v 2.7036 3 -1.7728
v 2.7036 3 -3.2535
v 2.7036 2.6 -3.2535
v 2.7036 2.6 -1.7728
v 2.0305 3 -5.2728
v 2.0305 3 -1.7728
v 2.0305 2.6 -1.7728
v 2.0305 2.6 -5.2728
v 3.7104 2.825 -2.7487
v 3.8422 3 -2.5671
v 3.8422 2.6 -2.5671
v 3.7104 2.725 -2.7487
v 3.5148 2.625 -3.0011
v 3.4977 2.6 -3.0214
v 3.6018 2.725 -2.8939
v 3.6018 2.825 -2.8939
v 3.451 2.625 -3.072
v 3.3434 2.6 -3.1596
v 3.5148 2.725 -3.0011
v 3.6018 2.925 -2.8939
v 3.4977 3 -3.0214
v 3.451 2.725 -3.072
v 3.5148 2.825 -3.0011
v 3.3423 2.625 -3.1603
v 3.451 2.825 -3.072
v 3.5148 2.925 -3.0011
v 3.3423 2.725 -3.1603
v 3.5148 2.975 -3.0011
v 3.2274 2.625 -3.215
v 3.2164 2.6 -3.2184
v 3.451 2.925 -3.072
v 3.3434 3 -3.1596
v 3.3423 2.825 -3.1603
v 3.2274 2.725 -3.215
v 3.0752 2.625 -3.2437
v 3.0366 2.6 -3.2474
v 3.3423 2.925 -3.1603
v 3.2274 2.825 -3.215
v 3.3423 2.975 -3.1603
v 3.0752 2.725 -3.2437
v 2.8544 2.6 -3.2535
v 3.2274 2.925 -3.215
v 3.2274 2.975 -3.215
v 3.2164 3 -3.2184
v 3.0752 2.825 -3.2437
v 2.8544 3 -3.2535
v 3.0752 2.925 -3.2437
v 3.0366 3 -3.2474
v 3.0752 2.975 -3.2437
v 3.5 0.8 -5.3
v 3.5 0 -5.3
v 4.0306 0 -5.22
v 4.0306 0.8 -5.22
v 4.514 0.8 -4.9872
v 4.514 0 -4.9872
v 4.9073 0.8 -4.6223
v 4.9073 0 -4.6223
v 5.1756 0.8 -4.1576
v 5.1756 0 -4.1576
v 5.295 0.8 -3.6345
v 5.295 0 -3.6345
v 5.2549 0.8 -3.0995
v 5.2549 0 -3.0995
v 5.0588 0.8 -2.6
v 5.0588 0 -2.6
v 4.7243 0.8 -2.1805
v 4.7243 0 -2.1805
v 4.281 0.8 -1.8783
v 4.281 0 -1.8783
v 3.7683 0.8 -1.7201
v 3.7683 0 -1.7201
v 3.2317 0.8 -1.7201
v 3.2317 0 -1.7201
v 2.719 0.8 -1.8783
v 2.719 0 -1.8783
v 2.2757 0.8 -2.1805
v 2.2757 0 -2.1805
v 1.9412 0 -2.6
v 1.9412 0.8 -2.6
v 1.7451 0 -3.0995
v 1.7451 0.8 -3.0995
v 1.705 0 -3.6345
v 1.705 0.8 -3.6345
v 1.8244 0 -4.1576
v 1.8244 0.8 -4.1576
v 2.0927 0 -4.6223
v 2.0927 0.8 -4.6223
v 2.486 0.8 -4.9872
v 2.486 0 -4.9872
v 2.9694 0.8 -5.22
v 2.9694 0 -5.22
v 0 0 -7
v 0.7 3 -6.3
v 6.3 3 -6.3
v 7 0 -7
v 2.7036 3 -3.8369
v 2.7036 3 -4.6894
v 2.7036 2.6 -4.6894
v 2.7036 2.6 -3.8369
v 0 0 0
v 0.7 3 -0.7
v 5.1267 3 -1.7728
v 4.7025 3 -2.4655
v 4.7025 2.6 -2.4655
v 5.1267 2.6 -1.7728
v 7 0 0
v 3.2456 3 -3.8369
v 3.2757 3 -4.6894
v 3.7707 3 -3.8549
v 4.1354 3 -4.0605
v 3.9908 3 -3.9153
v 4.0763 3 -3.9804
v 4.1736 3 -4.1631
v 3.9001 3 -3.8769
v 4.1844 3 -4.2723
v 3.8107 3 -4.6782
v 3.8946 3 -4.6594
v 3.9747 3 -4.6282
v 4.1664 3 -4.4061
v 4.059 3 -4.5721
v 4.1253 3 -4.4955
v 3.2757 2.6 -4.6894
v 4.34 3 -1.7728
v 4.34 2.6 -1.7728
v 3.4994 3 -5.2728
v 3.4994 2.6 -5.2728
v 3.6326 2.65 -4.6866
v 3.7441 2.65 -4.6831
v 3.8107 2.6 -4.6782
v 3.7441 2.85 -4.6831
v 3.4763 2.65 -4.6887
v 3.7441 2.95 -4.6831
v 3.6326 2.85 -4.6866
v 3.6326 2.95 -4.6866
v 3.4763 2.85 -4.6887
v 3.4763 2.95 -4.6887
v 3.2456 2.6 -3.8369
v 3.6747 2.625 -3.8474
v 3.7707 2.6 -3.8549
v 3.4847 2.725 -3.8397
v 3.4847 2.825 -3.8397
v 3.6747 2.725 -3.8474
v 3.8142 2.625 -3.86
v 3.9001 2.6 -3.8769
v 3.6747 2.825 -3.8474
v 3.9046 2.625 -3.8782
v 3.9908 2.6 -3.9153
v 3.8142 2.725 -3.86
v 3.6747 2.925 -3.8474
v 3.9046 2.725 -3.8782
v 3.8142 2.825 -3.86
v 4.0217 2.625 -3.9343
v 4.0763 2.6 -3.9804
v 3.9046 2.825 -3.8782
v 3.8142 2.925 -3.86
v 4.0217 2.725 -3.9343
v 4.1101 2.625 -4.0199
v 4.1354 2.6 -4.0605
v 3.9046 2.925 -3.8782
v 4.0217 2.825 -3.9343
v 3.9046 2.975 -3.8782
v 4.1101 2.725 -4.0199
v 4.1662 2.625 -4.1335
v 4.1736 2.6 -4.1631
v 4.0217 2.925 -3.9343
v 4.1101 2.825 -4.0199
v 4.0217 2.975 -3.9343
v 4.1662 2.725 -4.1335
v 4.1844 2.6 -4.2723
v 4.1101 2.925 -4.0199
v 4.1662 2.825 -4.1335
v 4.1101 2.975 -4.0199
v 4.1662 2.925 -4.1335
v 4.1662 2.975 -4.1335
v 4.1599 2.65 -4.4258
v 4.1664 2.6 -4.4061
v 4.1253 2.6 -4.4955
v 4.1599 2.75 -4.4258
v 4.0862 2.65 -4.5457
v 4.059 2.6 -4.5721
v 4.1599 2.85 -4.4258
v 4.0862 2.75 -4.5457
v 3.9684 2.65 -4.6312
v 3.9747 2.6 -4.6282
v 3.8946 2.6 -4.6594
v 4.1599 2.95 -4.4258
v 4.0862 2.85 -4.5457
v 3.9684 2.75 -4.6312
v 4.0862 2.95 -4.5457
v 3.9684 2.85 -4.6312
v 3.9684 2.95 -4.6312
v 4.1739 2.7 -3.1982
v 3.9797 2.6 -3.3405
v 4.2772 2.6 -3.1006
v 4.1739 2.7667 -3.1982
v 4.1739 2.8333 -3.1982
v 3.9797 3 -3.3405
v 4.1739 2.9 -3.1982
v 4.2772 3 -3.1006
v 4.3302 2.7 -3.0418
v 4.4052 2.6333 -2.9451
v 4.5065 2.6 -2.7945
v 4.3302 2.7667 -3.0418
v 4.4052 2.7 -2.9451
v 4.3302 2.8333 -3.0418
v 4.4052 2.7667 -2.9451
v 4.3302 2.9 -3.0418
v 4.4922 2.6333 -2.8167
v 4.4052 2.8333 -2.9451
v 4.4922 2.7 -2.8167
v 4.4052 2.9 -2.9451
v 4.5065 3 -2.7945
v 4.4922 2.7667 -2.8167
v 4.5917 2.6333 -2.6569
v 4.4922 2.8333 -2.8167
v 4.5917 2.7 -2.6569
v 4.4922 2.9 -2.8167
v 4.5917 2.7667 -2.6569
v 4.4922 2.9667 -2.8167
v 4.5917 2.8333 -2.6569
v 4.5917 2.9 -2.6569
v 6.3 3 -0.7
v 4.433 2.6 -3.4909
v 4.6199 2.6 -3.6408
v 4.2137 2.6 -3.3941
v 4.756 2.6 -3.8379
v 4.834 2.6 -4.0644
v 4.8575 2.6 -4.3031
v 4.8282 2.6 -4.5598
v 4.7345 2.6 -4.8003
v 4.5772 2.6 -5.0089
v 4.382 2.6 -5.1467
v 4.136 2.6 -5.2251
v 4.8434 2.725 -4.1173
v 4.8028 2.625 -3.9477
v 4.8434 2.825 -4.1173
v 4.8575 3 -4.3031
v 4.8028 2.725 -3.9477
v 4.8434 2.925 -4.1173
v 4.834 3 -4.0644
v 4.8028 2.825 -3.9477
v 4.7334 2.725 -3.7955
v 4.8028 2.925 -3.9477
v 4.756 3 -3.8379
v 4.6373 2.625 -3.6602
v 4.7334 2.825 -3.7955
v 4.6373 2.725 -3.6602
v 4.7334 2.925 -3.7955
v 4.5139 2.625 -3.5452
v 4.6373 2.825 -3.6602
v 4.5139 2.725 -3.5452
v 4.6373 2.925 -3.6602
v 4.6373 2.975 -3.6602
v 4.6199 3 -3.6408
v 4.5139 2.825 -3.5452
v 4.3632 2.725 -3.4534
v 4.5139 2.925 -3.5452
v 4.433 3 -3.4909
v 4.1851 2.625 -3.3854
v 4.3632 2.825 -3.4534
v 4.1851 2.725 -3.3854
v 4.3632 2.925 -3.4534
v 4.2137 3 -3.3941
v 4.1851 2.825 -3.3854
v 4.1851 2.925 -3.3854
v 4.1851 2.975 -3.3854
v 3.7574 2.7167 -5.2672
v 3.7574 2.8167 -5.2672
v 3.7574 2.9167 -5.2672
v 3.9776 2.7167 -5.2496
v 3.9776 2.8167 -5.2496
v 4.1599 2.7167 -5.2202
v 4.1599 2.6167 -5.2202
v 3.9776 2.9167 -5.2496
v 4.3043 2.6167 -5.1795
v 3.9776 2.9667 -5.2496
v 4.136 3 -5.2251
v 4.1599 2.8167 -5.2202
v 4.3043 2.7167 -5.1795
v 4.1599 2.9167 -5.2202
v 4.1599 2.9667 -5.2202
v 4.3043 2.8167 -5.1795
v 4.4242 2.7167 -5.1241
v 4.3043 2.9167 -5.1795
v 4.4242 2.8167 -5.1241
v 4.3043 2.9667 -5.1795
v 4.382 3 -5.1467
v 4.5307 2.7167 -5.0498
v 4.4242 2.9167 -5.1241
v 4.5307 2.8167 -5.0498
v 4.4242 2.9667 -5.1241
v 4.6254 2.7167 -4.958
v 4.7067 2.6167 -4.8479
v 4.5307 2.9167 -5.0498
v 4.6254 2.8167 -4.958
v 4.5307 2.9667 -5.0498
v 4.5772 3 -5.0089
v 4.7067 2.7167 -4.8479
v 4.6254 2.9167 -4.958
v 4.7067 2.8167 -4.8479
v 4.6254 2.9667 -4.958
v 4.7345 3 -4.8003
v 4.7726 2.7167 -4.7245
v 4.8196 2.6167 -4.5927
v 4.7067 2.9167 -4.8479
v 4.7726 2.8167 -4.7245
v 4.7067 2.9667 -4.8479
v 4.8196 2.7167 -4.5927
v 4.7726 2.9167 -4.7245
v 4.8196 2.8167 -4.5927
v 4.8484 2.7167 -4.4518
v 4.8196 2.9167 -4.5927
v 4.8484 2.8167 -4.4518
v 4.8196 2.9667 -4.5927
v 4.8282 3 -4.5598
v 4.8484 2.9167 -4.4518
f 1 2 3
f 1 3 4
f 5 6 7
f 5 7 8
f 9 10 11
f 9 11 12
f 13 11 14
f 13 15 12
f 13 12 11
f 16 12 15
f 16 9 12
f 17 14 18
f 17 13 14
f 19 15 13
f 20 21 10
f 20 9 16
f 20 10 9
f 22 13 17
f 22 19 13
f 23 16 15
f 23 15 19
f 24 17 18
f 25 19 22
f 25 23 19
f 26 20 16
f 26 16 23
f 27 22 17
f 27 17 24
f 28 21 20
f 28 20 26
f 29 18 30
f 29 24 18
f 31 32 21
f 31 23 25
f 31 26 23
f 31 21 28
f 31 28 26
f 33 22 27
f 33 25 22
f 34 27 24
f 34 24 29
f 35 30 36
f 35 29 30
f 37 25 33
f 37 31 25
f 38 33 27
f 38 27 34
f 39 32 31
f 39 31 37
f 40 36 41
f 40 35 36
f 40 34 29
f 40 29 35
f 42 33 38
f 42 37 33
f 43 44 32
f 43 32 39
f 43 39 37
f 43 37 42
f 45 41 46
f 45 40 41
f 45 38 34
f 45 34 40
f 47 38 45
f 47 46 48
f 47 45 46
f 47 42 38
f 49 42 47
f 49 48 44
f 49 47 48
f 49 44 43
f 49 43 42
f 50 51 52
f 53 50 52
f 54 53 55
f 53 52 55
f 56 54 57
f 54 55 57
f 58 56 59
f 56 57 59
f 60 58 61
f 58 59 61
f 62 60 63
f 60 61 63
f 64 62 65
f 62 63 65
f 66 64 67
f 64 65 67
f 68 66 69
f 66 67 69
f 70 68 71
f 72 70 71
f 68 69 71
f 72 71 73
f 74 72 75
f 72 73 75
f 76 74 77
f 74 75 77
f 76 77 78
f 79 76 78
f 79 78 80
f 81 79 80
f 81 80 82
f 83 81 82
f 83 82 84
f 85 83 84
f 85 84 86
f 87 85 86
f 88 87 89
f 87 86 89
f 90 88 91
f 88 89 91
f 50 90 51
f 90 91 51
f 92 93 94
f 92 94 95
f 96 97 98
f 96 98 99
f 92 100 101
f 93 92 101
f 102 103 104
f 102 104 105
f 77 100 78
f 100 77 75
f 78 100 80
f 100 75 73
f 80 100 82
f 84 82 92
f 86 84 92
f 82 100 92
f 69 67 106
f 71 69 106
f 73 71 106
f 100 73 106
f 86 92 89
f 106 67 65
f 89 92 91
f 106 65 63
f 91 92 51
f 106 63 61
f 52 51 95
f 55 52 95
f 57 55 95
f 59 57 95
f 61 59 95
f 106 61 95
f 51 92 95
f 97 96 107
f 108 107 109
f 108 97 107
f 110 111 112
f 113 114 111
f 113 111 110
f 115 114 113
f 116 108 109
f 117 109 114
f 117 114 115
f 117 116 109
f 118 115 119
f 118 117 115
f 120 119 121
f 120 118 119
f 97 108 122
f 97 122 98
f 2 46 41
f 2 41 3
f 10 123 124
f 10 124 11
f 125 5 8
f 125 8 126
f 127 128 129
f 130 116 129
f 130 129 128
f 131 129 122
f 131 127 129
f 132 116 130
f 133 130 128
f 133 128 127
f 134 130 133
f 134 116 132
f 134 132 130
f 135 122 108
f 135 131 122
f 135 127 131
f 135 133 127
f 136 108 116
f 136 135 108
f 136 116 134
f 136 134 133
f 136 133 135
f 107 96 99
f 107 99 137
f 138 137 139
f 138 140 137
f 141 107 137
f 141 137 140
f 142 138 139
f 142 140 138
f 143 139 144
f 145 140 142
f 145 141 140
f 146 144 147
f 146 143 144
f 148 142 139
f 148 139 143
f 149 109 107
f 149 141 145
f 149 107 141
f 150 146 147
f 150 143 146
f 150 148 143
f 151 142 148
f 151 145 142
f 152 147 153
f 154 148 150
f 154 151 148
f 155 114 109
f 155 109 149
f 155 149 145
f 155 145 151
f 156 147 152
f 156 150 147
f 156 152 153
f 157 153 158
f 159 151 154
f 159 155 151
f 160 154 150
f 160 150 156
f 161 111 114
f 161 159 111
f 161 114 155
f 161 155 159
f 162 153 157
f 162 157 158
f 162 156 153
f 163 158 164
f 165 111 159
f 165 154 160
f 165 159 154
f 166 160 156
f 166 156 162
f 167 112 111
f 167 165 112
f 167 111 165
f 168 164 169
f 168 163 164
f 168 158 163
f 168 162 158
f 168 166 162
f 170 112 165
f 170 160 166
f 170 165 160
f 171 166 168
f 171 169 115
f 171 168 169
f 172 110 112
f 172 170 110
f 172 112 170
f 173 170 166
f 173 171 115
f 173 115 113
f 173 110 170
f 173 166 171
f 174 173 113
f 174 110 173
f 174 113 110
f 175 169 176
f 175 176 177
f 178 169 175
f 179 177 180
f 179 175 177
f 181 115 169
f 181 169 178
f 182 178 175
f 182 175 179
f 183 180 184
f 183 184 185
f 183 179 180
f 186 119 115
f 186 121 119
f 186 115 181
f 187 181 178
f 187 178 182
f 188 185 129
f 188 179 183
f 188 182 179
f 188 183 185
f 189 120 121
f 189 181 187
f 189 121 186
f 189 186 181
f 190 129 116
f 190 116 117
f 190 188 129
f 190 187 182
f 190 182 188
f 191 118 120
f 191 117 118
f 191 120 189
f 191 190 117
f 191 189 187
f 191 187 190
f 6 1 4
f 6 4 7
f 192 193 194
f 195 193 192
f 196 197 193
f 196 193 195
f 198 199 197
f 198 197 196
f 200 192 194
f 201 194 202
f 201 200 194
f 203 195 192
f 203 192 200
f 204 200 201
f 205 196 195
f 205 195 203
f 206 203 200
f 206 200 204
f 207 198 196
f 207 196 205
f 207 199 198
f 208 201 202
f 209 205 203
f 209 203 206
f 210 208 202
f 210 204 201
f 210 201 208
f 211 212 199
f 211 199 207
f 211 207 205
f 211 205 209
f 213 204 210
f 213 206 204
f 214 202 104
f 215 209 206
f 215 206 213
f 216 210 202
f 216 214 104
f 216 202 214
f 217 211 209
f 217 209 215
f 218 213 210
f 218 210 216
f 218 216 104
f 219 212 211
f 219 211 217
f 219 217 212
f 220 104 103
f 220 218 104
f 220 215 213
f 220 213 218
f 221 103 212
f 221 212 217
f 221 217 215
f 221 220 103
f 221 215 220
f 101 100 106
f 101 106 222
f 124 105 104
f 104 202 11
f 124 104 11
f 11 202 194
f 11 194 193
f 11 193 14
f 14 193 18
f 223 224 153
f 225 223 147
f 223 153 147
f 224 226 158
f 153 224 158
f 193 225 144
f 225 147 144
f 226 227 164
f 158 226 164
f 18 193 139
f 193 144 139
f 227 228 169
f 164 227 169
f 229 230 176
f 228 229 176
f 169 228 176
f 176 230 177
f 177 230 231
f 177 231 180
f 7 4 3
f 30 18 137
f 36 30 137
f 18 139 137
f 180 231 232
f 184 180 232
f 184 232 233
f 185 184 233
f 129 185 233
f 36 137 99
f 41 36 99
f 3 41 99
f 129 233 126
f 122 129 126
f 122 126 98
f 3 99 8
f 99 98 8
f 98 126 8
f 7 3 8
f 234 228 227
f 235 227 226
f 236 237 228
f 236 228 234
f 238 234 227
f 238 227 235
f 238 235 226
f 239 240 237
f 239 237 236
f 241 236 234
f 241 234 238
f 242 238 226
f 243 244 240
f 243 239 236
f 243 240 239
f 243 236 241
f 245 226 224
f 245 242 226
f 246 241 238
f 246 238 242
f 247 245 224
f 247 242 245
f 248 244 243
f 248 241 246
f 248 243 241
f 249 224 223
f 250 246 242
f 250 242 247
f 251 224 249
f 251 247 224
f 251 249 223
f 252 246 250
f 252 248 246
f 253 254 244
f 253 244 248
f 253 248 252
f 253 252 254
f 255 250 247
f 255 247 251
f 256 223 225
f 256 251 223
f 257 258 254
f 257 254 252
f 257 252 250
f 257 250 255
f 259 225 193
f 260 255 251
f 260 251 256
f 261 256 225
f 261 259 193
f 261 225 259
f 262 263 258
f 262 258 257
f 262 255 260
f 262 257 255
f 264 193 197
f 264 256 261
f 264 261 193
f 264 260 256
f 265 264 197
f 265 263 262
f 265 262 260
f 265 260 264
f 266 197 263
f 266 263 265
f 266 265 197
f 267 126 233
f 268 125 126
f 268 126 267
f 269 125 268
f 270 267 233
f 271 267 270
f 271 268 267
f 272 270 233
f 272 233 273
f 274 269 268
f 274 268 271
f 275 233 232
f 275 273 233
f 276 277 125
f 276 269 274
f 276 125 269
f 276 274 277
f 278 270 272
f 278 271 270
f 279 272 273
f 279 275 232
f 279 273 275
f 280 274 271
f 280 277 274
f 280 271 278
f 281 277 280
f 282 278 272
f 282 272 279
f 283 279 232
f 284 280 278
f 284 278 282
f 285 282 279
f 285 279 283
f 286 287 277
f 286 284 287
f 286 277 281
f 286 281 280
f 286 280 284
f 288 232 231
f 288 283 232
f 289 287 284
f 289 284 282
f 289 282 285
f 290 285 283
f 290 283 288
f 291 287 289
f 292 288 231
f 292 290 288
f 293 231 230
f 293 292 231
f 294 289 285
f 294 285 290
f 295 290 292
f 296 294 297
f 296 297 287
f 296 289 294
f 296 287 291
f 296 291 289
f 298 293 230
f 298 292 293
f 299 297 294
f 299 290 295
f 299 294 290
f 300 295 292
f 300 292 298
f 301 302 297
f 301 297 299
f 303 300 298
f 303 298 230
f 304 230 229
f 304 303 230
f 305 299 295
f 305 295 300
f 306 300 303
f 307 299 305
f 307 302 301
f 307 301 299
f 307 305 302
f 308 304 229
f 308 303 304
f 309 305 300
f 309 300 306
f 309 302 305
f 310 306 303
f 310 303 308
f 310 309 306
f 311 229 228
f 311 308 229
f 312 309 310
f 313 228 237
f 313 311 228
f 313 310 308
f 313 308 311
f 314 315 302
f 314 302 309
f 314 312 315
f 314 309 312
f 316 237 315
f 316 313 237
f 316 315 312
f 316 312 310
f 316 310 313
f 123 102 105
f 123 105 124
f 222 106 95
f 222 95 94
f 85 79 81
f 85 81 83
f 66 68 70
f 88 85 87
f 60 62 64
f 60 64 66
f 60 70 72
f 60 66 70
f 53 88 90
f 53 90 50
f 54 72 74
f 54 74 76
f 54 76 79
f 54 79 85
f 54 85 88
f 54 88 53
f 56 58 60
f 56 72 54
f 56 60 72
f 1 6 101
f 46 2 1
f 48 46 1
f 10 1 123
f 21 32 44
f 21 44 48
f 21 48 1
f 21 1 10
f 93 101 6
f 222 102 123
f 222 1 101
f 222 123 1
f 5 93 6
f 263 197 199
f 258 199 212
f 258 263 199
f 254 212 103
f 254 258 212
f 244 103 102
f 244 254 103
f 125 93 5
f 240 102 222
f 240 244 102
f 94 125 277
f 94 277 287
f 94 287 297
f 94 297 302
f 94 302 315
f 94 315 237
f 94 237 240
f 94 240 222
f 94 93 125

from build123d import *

# Parameters (mm, degrees)
SKETCH1_W           = 7
SKETCH1_H           = 7
BOSS_EXTRUDE1_DEPTH = 3
CUT_EXTRUDE1_DEPTH  = 7
CUT_EXTRUDE2_DEPTH  = 11
SKETCH4_R           = 1.8
CUT_EXTRUDE3_DEPTH  = 0.8
CUT_EXTRUDE4_DEPTH  = 0.4


with BuildPart() as part:
    # Sketch1 → Boss-Extrude1 (new body)
    with BuildSketch(Plane(origin=(0, 0, 0), x_dir=(1, 0, 0), z_dir=(0, 1, 0))):
        with Locations((3.5, 3.5)):
            Rectangle(SKETCH1_W, SKETCH1_H)
    extrude(amount=BOSS_EXTRUDE1_DEPTH)

    # Sketch2 → Cut-Extrude1 (cut)
    with BuildSketch(Plane.XY):
        Polygon((0, 0), (0.7, 3), (0, 3), align=None)
        Polygon((7, 0), (6.3, 3), (7, 3), align=None)
    extrude(amount=-CUT_EXTRUDE1_DEPTH, mode=Mode.SUBTRACT)

    # Sketch3 → Cut-Extrude2 (cut)
    with BuildSketch(Plane(origin=(0, 0, 0), x_dir=(0, 0, -1), z_dir=(1, 0, 0))):
        Polygon((0, 0), (0.7, 3), (0, 3), align=None)
        Polygon((7, 3), (6.3, 3), (7, 0), align=None)
    extrude(amount=CUT_EXTRUDE2_DEPTH, mode=Mode.SUBTRACT)

    # Sketch4 → Cut-Extrude3 (cut)
    with BuildSketch(Plane.XZ):
        with Locations(Location((3.5, -3.5, 0), (0, 0, 270))):
            Circle(SKETCH4_R)
    extrude(amount=-CUT_EXTRUDE3_DEPTH, mode=Mode.SUBTRACT)

    # Sketch5 → Cut-Extrude4 (cut)
    with BuildSketch(Plane(origin=(0, 3, 0), x_dir=(1, 0, 0), z_dir=(0, 1, 0))):
        with BuildLine():
            Line((2.030546131, 1.772776287), (2.030546131, 5.272776287))
            Line((2.030546131, 5.272776287), (3.499396292, 5.272776287))
            add(Edge.make_bspline(
                [(3.499396292, 5.272776287), (3.5440361, 5.272501173), (3.63006518, 5.271970977), (3.754480014, 5.268104688), (3.869218418, 5.260004585), (3.974789374, 5.250831153), (4.070685816, 5.2374844), (4.157286901, 5.221495121), (4.23444683, 5.202965752), (4.303291413, 5.180773827), (4.366063686, 5.155374398), (4.424539139, 5.125141932), (4.479360726, 5.089720882), (4.531370453, 5.050332114), (4.580788559, 5.006915106), (4.626260263, 4.958320831), (4.668577803, 4.90527287), (4.707707034, 4.848212589), (4.742177437, 4.787391941), (4.773674335, 4.724764195), (4.799313998, 4.659662899), (4.820492127, 4.592394727), (4.837409543, 4.523105729), (4.849151659, 4.451619746), (4.856482135, 4.378066169), (4.857136528, 4.328382861), (4.857469208, 4.303124845)],
                knots=[0, 0, 0, 0, 1.675828044, 3.229627355, 4.67171229, 5.993455049, 7.206927059, 8.304770529, 9.29850117, 10.183580433, 11.017754134, 11.837875825, 12.650738409, 13.464925643, 14.285328857, 15.117007378, 15.959673368, 16.830859064, 17.711229498, 18.58228265, 19.460420693, 20.334473227, 21.228207035, 22.135446768, 23.052097822, 24, 24, 24, 24], degree=3))
            add(Edge.make_bspline(
                [(4.857469208, 4.303124845), (4.856852136, 4.271306813), (4.855646207, 4.20912561), (4.844548611, 4.117987318), (4.828065847, 4.030911185), (4.804569794, 3.947776576), (4.772263199, 3.869561272), (4.734759192, 3.795169587), (4.690029362, 3.724853862), (4.638377601, 3.659311167), (4.579850151, 3.598483484), (4.51419052, 3.543622601), (4.441867499, 3.494514108), (4.362443578, 3.451441194), (4.276471789, 3.414618521), (4.18357933, 3.383637045), (4.084186726, 3.358421575), (4.015049286, 3.346556943), (3.979664721, 3.34048462)],
                knots=[0, 0, 0, 0, 1.05911256, 2.069797862, 3.05271628, 4.008392045, 4.940519534, 5.866323021, 6.779546087, 7.71056835, 8.640711998, 9.585328432, 10.554502533, 11.547017206, 12.589327225, 13.664782803, 14.804835066, 16, 16, 16, 16], degree=3))
            add(Edge.make_bspline(
                [(3.979664721, 3.34048462), (4.013885569, 3.317819831), (4.080860431, 3.27346175), (4.173524973, 3.200403435), (4.256715746, 3.123723082), (4.319703603, 3.055534143), (4.368103279, 2.995569296), (4.407073288, 2.943123463), (4.44910869, 2.882765916), (4.493797209, 2.814463953), (4.542459952, 2.738821883), (4.593287063, 2.65468189), (4.647342172, 2.562864685), (4.683685664, 2.49872572), (4.702521292, 2.46548462)],
                knots=[0, 0, 0, 0, 1.285445069, 2.515791127, 3.691898215, 4.826622834, 5.420063933, 6.105349801, 6.873086501, 7.723915395, 8.66222816, 9.690593598, 10.803111229, 12, 12, 12, 12], degree=3))
            Line((4.702521292, 2.46548462), (5.126699978, 1.772776287))
            Line((5.126699978, 1.772776287), (4.340041324, 1.772776287))
            Line((4.340041324, 1.772776287), (3.842244849, 2.56714728))
            add(Edge.make_bspline(
                [(3.842244849, 2.56714728), (3.819383068, 2.598961265), (3.775735226, 2.659700703), (3.71272687, 2.746013416), (3.655079817, 2.822847232), (3.604328246, 2.891315046), (3.55790415, 2.949475634), (3.517217149, 2.998342534), (3.483095985, 3.038964357), (3.444487802, 3.079242648), (3.399571281, 3.120637513), (3.343968216, 3.16077219), (3.286869026, 3.192767131), (3.225691806, 3.217180023), (3.154942198, 3.234202313), (3.069889966, 3.245047676), (2.967860868, 3.253049263), (2.894114271, 3.253371714), (2.85436424, 3.253545518)],
                knots=[0, 0, 0, 0, 1.465447777, 2.797841088, 3.997266218, 5.05856206, 5.985598736, 6.780315439, 7.437430484, 7.969193402, 8.866571936, 9.718200644, 10.52825214, 11.309096006, 12.174169268, 13.242355782, 14.513606761, 16, 16, 16, 16], degree=3))
            Line((2.85436424, 3.253545518), (2.703623054, 3.253545518))
            Line((2.703623054, 3.253545518), (2.703623054, 1.772776287))
            Line((2.703623054, 1.772776287), (2.030546131, 1.772776287))
        make_face()
        with BuildLine():
            Line((2.703623054, 3.836878851), (3.245590202, 3.836878851))
            add(Edge.make_bspline(
                [(3.245590202, 3.836878851), (3.287425822, 3.836968507), (3.367129748, 3.837139318), (3.480470316, 3.839613437), (3.581721608, 3.841713365), (3.670277711, 3.846989524), (3.746534832, 3.852218694), (3.810187065, 3.859014719), (3.861770698, 3.867047401), (3.913294077, 3.879536112), (3.966071524, 3.901295225), (4.022322296, 3.932286607), (4.070398439, 3.972490835), (4.112043483, 4.018970988), (4.143812817, 4.073612635), (4.16869572, 4.133981429), (4.181311879, 4.201418818), (4.183343969, 4.24816171), (4.184392285, 4.272275486)],
                knots=[0, 0, 0, 0, 1.697953026, 3.23488743, 4.60134403, 5.807846676, 6.835100678, 7.703488618, 8.405232423, 8.952775585, 9.851109663, 10.713519226, 11.549115941, 12.382556273, 13.233359028, 14.101746968, 15.020727134, 16, 16, 16, 16], degree=3))
            add(Edge.make_bspline(
                [(4.184392285, 4.272275486), (4.183200022, 4.299251728), (4.180899743, 4.351298039), (4.162759412, 4.425360435), (4.131096203, 4.490784365), (4.0876106, 4.547677846), (4.033021276, 4.595719522), (3.967999354, 4.633854155), (3.893027901, 4.662255248), (3.838953649, 4.672743717), (3.810694369, 4.678225005)],
                knots=[0, 0, 0, 0, 1.062977961, 2.050844577, 2.982300261, 3.90936959, 4.856017476, 5.831122378, 6.86654153, 8, 8, 8, 8], degree=3))
            add(Edge.make_bspline(
                [(3.810694369, 4.678225005), (3.801353235, 4.679251395), (3.779212787, 4.681684154), (3.74011538, 4.683246609), (3.690124331, 4.685648271), (3.628634545, 4.686629777), (3.556195371, 4.688350271), (3.472518757, 4.688666197), (3.377870551, 4.689675558), (3.311028641, 4.689523327), (3.275738439, 4.689442953)],
                knots=[0, 0, 0, 0, 0.42127143, 0.998501726, 1.753681744, 2.66564073, 3.755712164, 5.002818897, 6.417592707, 8, 8, 8, 8], degree=3))
            Line((3.275738439, 4.689442953), (2.703623054, 4.689442953))
            Line((2.703623054, 4.689442953), (2.703623054, 3.836878851))
        make_face(mode=Mode.SUBTRACT)
    extrude(amount=-CUT_EXTRUDE4_DEPTH, mode=Mode.SUBTRACT)


solid = part.part
